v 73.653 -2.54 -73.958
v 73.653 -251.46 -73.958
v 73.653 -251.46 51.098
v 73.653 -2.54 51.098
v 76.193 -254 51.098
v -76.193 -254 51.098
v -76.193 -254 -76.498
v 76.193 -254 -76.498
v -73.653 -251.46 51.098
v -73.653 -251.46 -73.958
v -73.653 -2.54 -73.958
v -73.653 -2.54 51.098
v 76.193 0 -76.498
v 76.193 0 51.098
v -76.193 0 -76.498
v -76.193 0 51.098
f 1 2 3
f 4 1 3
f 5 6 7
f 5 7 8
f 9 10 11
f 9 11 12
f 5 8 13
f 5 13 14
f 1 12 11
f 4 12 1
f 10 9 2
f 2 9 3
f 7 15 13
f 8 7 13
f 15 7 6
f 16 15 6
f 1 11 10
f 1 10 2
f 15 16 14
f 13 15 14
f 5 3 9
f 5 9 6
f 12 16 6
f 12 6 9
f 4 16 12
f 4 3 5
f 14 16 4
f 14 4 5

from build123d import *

# Parameters (mm, degrees)
F0_W     = 152.3854583502
F0_H     = 152.996212244
F1_DEPTH = 254
F2_W     = 152.3854583502
F2_H     = 254
F3_DEPTH = 25.4
F4_T     = -2.54


with BuildPart() as f1:
    # F0 (on Front) → F1 (new body)
    with BuildSketch(Plane.XZ):
        Rectangle(F0_W, F0_H)
    extrude(amount=F1_DEPTH)

    # F2 (on face) → F3 (cut)
    with BuildSketch(Plane.XY.offset(76.498106122)):
        with Locations((0, -127)):
            Rectangle(F2_W, F2_H)
    extrude(amount=-F3_DEPTH, mode=Mode.SUBTRACT)

    # F4
    f4_openings = [f1.faces().sort_by_distance(p)[0] for p in [
        (0, -127, 51.098106),
    ]]
    offset(amount=F4_T, openings=f4_openings)


solid = f1.part
